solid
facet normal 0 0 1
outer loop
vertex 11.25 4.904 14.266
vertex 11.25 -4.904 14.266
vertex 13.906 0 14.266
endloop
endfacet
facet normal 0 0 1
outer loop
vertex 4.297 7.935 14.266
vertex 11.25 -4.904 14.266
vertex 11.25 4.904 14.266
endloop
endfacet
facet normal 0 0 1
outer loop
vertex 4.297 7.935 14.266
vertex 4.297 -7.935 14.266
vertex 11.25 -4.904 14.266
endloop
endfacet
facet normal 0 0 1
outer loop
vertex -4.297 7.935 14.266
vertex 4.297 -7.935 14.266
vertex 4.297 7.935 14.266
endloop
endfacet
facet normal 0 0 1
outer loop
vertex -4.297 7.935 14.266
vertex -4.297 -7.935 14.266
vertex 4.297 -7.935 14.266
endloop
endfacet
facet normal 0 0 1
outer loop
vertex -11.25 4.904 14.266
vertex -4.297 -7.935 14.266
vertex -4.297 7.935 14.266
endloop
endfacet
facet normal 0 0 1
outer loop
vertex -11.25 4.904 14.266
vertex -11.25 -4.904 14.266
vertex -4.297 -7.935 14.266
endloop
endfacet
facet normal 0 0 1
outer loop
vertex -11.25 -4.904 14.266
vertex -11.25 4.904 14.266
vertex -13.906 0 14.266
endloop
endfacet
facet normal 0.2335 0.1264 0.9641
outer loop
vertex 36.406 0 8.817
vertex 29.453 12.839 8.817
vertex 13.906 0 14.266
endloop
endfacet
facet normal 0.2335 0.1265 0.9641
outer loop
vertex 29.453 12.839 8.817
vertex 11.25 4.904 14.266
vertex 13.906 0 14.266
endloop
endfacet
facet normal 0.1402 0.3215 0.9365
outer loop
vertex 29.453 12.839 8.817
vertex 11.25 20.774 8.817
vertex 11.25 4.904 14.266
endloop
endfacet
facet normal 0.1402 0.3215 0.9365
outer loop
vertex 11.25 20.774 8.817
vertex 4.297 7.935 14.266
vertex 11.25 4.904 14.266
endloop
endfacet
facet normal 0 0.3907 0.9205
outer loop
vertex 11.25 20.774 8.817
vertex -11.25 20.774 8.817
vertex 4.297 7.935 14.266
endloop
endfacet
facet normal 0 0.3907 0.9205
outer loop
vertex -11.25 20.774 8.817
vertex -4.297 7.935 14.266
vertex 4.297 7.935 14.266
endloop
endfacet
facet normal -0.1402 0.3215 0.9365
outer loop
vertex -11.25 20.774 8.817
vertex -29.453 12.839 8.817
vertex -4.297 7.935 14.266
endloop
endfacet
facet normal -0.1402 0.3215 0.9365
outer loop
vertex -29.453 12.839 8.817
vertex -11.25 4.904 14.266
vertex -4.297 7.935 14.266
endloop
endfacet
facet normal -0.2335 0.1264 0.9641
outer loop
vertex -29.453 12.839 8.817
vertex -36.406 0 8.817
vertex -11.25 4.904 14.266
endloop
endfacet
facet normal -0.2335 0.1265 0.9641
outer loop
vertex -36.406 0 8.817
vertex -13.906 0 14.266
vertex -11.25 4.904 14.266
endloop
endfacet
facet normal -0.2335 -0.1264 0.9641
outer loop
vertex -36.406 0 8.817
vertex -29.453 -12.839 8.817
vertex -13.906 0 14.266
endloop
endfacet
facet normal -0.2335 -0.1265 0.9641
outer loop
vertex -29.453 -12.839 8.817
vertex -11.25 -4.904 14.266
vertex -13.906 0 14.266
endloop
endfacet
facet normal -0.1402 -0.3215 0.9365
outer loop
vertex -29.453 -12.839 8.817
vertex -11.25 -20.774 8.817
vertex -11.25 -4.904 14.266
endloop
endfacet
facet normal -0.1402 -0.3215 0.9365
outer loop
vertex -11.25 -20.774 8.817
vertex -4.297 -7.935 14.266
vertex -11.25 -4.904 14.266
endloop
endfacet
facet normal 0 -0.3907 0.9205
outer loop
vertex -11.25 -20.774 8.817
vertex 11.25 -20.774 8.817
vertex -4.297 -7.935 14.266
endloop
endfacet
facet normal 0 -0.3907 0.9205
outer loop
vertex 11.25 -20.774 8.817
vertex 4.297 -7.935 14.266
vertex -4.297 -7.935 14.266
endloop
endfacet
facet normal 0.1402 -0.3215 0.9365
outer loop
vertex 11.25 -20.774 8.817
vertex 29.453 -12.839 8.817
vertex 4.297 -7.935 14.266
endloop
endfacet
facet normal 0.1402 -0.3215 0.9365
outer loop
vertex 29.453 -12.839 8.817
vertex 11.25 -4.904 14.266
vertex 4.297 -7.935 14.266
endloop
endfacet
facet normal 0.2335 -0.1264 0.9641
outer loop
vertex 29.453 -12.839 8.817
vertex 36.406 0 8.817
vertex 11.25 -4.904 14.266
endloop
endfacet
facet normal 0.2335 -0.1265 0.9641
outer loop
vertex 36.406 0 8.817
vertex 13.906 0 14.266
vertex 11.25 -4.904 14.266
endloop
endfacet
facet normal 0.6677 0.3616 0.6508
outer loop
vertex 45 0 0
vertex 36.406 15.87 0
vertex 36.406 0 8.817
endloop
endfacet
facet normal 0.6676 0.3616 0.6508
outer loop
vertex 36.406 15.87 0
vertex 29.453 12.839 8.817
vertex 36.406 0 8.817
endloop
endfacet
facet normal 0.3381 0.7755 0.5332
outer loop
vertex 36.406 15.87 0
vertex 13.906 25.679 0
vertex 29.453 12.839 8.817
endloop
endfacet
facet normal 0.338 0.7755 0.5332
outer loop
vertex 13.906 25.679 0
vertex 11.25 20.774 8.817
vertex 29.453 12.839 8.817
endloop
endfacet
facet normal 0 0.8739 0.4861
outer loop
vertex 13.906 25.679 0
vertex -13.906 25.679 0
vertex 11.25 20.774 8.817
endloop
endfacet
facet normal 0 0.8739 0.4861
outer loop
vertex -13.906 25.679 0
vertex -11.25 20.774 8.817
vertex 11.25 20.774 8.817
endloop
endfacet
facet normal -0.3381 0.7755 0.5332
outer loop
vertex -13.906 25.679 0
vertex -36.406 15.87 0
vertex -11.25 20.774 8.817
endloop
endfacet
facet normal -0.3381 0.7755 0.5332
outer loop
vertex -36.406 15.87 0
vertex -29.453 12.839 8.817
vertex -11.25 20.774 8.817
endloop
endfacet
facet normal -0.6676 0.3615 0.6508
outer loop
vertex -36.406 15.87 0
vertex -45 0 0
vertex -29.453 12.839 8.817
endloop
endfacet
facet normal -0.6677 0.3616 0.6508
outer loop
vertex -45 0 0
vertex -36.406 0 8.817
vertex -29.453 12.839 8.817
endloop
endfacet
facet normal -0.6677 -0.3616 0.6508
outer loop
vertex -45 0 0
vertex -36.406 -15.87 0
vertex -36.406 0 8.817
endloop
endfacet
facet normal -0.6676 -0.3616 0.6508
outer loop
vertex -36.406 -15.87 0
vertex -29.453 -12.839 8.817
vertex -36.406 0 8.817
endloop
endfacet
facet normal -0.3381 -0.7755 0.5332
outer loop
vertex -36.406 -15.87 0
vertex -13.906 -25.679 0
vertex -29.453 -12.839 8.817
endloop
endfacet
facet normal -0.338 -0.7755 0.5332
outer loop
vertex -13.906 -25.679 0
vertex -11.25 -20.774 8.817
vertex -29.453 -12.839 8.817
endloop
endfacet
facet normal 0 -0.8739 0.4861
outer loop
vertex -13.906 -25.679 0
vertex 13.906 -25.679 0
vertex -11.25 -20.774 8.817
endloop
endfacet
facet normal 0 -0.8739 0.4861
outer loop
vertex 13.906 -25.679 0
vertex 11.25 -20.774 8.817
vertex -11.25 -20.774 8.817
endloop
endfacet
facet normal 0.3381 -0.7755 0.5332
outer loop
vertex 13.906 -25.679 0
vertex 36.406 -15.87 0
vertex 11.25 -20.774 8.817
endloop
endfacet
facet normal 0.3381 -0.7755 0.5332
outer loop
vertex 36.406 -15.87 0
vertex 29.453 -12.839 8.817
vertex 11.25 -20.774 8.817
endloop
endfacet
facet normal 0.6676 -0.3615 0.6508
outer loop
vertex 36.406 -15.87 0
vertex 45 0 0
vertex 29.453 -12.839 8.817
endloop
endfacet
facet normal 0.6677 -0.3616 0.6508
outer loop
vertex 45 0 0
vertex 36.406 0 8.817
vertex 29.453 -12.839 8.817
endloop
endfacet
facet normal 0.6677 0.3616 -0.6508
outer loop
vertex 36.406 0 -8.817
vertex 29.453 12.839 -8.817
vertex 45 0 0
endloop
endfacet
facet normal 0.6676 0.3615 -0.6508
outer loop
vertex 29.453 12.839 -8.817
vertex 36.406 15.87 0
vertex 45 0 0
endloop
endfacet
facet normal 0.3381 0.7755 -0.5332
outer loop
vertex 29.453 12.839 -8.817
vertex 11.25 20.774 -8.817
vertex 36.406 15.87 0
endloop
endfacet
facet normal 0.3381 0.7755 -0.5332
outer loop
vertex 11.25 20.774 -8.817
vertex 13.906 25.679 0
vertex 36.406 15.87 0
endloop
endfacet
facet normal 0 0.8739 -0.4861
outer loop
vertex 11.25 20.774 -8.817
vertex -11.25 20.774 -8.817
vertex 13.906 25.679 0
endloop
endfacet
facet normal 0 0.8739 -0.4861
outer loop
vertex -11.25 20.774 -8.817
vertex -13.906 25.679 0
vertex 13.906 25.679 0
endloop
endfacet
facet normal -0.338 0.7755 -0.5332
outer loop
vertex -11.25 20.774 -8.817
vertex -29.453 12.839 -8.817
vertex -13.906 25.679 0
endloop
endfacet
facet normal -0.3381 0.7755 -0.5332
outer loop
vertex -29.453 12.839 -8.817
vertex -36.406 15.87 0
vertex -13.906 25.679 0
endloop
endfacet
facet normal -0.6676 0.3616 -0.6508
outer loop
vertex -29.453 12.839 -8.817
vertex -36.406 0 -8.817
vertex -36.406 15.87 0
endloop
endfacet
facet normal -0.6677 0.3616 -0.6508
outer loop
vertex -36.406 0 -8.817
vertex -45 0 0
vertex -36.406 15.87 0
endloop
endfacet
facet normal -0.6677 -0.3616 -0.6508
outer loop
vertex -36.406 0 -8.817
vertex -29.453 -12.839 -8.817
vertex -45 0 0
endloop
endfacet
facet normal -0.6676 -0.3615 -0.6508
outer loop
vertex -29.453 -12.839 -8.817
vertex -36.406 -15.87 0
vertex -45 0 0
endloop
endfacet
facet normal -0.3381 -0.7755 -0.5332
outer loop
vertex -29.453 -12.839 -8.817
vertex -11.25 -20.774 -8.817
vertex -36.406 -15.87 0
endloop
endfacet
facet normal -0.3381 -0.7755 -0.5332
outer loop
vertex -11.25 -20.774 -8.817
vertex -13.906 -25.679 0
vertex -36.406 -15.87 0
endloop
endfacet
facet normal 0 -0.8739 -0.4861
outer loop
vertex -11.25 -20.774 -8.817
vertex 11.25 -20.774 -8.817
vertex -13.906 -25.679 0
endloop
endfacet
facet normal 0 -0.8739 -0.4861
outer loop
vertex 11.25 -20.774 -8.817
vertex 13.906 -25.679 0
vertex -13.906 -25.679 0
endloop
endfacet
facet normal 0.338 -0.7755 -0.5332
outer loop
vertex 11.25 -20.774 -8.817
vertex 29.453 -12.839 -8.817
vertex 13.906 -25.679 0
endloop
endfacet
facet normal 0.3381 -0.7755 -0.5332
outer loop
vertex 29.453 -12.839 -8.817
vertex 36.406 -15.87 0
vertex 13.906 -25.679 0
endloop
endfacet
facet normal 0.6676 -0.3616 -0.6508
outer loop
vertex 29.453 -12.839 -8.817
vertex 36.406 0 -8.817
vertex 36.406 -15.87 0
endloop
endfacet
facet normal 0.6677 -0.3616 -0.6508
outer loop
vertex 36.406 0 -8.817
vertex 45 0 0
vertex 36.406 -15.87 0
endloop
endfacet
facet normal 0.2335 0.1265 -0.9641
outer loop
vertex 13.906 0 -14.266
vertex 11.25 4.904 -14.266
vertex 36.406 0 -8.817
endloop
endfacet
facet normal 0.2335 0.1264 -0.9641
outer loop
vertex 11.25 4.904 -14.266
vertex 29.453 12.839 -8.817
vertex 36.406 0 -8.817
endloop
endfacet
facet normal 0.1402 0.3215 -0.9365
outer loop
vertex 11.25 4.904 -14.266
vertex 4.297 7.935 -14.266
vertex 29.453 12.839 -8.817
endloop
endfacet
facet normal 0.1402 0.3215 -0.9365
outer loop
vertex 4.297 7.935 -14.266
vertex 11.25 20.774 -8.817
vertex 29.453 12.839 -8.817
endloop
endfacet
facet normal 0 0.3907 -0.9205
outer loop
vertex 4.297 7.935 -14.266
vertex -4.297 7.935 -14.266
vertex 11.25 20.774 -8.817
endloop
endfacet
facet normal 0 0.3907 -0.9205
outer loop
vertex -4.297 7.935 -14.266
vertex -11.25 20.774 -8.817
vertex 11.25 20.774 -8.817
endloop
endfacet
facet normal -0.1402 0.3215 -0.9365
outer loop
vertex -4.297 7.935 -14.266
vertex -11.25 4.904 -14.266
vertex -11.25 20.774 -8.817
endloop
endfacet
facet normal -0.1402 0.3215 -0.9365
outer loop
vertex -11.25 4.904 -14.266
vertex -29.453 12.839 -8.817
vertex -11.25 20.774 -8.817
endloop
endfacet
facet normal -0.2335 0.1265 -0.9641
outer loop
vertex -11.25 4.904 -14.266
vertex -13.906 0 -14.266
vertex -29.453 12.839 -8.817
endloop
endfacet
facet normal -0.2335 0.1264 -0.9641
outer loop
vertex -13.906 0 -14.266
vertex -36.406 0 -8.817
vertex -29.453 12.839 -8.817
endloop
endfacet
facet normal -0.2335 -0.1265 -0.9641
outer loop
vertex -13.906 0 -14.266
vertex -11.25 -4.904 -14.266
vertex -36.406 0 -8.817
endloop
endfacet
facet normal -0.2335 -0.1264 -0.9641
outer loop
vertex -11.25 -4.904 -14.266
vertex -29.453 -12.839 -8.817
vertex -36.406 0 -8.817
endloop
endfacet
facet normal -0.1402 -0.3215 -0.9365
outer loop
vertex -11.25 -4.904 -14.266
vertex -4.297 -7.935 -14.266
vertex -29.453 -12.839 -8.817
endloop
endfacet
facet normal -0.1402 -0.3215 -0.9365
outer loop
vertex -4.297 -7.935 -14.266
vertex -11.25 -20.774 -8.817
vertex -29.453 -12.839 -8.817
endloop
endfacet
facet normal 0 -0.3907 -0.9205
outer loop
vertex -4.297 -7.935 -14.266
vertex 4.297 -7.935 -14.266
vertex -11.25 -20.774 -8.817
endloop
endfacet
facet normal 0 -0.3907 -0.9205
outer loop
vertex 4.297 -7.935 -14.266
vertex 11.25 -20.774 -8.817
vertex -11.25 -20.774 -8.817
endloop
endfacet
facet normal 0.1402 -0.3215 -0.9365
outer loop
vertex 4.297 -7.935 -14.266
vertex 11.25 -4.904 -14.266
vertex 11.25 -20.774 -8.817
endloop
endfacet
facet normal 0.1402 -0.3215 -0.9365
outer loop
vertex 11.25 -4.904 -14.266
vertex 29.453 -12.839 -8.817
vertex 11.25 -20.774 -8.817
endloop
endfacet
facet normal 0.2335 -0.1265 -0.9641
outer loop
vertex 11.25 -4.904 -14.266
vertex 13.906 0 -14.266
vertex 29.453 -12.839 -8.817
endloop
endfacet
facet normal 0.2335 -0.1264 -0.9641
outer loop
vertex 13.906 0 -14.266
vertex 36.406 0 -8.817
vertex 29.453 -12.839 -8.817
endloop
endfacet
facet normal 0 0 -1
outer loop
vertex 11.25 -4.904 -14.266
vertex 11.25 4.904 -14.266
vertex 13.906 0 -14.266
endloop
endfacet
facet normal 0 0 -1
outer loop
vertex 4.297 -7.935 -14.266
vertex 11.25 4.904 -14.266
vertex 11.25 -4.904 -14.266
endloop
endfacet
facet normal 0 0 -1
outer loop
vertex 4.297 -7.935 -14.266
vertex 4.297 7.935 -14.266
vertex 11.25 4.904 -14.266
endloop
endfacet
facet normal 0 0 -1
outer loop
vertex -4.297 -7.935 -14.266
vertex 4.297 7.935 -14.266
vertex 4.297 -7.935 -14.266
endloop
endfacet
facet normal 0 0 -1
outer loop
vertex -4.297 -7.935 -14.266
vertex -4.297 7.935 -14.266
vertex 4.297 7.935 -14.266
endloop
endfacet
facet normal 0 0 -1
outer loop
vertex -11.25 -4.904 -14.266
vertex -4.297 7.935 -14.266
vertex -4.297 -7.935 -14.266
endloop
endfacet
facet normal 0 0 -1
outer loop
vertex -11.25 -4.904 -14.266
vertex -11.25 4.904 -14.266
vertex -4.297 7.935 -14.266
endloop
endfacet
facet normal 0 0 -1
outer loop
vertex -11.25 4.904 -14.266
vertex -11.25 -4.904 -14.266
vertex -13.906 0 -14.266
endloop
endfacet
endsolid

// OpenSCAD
// Generated by SolidPython 1.0.1 on 2020-07-29 00:46:51


scale(v = [15, 9, 5]) {
	sphere(r = 3);
}
/***********************************************
*********      SolidPython code:      **********
************************************************
 
# import packages: SolidPython
from solid import *
from solid.utils import *
from itertools import chain, combinations, permutations


class Resize:

    def __init__(self, scad_file):
        self.scad_file = scad_file
        #self.scad_file = import_scad(scad_file)
        # cone/cylinder param:
        self.r1 = 0
        self.r2 = 0
        self.h = 0
        # rectangular prism param:
        self.w = 0
        self.l = 0
        # ellipse param:
        self.r = 0

    # import OpenScad code (file name corresponds to shape)


    # classify shape + parameters
    def assign(self, param1, param2, param3):
        if self.scad_file == 'cone.scad':
            self.r1 = param1
            self.r2 = param2
            self.h = param3
        elif self.scad_file == 'cylinder.scad':
            self.r1 = param1
            self.r2 = param2
            self.h = param3
        elif self.scad_file == 'rectangularPrism.scad':
            self.h = param1
            self.l = param2
            self.w = param3
        else:
            self.r = param1
            self.h = param2

    # resize parameters
    def iterate(self):
        x = range(3, 20, 2)
        i = 1
        if self.scad_file == 'cone.scad':
            tempList = list(permutations(x, 2))
            for temp in tempList:
                param1 = temp[0]
                param2 = temp[1]
                filepath = 'produced_scad_files/' + 'cone' + str(param1) + '_' + str(param2) + '_' + '.scad'
                scad_render_to_file(cylinder(h=param1, r1=param2, r2=0), filepath)

        elif self.scad_file == 'cylinder.scad':
            tempList = list(permutations(x, 3))
            for temp in tempList:
                param1 = temp[0]
                param2 = temp[1]
                filepath = 'produced_scad_files/' + 'cylinder' + str(param1) + '_' + str(param2) + '_' + '.scad'
                scad_render_to_file(cylinder(h=param1, r1=param2, r2=param2), filepath)

        elif self.scad_file == 'rectangularPrism.scad':
            tempList = list(permutations(x, 3))
            for temp in tempList:
                param1 = temp[0]
                param2 = temp[1]
                param3 = temp[2]
                filepath = 'produced_scad_files/' + 'rectangularPrism' + str(param1) + '_' + str(param2) + '_' + str(
                    param3) + '.scad'
                scad_render_to_file(cube(size=(param1, param2, param3)), filepath)

        elif self.scad_file == 'ellipse.scad':
            tempList = list(permutations(x, 4))
            for temp in tempList:
                param1 = temp[0]
                param2 = temp[1]
                param3 = temp[2]
                param4 = temp[3]
                filepath = 'produced_scad_files/' + 'ellipse' + str(param1) + '_' + str(param2) + '_' + str(param3) + '_' + str(param4) + '.scad'
                scad_render_to_file(scale([param1, param2, param3])(sphere(r=param4)), filepath)

    def render_to_scadfile(self):
        scad_render_to_file(scad, 'example.scad') 
 
************************************************/
